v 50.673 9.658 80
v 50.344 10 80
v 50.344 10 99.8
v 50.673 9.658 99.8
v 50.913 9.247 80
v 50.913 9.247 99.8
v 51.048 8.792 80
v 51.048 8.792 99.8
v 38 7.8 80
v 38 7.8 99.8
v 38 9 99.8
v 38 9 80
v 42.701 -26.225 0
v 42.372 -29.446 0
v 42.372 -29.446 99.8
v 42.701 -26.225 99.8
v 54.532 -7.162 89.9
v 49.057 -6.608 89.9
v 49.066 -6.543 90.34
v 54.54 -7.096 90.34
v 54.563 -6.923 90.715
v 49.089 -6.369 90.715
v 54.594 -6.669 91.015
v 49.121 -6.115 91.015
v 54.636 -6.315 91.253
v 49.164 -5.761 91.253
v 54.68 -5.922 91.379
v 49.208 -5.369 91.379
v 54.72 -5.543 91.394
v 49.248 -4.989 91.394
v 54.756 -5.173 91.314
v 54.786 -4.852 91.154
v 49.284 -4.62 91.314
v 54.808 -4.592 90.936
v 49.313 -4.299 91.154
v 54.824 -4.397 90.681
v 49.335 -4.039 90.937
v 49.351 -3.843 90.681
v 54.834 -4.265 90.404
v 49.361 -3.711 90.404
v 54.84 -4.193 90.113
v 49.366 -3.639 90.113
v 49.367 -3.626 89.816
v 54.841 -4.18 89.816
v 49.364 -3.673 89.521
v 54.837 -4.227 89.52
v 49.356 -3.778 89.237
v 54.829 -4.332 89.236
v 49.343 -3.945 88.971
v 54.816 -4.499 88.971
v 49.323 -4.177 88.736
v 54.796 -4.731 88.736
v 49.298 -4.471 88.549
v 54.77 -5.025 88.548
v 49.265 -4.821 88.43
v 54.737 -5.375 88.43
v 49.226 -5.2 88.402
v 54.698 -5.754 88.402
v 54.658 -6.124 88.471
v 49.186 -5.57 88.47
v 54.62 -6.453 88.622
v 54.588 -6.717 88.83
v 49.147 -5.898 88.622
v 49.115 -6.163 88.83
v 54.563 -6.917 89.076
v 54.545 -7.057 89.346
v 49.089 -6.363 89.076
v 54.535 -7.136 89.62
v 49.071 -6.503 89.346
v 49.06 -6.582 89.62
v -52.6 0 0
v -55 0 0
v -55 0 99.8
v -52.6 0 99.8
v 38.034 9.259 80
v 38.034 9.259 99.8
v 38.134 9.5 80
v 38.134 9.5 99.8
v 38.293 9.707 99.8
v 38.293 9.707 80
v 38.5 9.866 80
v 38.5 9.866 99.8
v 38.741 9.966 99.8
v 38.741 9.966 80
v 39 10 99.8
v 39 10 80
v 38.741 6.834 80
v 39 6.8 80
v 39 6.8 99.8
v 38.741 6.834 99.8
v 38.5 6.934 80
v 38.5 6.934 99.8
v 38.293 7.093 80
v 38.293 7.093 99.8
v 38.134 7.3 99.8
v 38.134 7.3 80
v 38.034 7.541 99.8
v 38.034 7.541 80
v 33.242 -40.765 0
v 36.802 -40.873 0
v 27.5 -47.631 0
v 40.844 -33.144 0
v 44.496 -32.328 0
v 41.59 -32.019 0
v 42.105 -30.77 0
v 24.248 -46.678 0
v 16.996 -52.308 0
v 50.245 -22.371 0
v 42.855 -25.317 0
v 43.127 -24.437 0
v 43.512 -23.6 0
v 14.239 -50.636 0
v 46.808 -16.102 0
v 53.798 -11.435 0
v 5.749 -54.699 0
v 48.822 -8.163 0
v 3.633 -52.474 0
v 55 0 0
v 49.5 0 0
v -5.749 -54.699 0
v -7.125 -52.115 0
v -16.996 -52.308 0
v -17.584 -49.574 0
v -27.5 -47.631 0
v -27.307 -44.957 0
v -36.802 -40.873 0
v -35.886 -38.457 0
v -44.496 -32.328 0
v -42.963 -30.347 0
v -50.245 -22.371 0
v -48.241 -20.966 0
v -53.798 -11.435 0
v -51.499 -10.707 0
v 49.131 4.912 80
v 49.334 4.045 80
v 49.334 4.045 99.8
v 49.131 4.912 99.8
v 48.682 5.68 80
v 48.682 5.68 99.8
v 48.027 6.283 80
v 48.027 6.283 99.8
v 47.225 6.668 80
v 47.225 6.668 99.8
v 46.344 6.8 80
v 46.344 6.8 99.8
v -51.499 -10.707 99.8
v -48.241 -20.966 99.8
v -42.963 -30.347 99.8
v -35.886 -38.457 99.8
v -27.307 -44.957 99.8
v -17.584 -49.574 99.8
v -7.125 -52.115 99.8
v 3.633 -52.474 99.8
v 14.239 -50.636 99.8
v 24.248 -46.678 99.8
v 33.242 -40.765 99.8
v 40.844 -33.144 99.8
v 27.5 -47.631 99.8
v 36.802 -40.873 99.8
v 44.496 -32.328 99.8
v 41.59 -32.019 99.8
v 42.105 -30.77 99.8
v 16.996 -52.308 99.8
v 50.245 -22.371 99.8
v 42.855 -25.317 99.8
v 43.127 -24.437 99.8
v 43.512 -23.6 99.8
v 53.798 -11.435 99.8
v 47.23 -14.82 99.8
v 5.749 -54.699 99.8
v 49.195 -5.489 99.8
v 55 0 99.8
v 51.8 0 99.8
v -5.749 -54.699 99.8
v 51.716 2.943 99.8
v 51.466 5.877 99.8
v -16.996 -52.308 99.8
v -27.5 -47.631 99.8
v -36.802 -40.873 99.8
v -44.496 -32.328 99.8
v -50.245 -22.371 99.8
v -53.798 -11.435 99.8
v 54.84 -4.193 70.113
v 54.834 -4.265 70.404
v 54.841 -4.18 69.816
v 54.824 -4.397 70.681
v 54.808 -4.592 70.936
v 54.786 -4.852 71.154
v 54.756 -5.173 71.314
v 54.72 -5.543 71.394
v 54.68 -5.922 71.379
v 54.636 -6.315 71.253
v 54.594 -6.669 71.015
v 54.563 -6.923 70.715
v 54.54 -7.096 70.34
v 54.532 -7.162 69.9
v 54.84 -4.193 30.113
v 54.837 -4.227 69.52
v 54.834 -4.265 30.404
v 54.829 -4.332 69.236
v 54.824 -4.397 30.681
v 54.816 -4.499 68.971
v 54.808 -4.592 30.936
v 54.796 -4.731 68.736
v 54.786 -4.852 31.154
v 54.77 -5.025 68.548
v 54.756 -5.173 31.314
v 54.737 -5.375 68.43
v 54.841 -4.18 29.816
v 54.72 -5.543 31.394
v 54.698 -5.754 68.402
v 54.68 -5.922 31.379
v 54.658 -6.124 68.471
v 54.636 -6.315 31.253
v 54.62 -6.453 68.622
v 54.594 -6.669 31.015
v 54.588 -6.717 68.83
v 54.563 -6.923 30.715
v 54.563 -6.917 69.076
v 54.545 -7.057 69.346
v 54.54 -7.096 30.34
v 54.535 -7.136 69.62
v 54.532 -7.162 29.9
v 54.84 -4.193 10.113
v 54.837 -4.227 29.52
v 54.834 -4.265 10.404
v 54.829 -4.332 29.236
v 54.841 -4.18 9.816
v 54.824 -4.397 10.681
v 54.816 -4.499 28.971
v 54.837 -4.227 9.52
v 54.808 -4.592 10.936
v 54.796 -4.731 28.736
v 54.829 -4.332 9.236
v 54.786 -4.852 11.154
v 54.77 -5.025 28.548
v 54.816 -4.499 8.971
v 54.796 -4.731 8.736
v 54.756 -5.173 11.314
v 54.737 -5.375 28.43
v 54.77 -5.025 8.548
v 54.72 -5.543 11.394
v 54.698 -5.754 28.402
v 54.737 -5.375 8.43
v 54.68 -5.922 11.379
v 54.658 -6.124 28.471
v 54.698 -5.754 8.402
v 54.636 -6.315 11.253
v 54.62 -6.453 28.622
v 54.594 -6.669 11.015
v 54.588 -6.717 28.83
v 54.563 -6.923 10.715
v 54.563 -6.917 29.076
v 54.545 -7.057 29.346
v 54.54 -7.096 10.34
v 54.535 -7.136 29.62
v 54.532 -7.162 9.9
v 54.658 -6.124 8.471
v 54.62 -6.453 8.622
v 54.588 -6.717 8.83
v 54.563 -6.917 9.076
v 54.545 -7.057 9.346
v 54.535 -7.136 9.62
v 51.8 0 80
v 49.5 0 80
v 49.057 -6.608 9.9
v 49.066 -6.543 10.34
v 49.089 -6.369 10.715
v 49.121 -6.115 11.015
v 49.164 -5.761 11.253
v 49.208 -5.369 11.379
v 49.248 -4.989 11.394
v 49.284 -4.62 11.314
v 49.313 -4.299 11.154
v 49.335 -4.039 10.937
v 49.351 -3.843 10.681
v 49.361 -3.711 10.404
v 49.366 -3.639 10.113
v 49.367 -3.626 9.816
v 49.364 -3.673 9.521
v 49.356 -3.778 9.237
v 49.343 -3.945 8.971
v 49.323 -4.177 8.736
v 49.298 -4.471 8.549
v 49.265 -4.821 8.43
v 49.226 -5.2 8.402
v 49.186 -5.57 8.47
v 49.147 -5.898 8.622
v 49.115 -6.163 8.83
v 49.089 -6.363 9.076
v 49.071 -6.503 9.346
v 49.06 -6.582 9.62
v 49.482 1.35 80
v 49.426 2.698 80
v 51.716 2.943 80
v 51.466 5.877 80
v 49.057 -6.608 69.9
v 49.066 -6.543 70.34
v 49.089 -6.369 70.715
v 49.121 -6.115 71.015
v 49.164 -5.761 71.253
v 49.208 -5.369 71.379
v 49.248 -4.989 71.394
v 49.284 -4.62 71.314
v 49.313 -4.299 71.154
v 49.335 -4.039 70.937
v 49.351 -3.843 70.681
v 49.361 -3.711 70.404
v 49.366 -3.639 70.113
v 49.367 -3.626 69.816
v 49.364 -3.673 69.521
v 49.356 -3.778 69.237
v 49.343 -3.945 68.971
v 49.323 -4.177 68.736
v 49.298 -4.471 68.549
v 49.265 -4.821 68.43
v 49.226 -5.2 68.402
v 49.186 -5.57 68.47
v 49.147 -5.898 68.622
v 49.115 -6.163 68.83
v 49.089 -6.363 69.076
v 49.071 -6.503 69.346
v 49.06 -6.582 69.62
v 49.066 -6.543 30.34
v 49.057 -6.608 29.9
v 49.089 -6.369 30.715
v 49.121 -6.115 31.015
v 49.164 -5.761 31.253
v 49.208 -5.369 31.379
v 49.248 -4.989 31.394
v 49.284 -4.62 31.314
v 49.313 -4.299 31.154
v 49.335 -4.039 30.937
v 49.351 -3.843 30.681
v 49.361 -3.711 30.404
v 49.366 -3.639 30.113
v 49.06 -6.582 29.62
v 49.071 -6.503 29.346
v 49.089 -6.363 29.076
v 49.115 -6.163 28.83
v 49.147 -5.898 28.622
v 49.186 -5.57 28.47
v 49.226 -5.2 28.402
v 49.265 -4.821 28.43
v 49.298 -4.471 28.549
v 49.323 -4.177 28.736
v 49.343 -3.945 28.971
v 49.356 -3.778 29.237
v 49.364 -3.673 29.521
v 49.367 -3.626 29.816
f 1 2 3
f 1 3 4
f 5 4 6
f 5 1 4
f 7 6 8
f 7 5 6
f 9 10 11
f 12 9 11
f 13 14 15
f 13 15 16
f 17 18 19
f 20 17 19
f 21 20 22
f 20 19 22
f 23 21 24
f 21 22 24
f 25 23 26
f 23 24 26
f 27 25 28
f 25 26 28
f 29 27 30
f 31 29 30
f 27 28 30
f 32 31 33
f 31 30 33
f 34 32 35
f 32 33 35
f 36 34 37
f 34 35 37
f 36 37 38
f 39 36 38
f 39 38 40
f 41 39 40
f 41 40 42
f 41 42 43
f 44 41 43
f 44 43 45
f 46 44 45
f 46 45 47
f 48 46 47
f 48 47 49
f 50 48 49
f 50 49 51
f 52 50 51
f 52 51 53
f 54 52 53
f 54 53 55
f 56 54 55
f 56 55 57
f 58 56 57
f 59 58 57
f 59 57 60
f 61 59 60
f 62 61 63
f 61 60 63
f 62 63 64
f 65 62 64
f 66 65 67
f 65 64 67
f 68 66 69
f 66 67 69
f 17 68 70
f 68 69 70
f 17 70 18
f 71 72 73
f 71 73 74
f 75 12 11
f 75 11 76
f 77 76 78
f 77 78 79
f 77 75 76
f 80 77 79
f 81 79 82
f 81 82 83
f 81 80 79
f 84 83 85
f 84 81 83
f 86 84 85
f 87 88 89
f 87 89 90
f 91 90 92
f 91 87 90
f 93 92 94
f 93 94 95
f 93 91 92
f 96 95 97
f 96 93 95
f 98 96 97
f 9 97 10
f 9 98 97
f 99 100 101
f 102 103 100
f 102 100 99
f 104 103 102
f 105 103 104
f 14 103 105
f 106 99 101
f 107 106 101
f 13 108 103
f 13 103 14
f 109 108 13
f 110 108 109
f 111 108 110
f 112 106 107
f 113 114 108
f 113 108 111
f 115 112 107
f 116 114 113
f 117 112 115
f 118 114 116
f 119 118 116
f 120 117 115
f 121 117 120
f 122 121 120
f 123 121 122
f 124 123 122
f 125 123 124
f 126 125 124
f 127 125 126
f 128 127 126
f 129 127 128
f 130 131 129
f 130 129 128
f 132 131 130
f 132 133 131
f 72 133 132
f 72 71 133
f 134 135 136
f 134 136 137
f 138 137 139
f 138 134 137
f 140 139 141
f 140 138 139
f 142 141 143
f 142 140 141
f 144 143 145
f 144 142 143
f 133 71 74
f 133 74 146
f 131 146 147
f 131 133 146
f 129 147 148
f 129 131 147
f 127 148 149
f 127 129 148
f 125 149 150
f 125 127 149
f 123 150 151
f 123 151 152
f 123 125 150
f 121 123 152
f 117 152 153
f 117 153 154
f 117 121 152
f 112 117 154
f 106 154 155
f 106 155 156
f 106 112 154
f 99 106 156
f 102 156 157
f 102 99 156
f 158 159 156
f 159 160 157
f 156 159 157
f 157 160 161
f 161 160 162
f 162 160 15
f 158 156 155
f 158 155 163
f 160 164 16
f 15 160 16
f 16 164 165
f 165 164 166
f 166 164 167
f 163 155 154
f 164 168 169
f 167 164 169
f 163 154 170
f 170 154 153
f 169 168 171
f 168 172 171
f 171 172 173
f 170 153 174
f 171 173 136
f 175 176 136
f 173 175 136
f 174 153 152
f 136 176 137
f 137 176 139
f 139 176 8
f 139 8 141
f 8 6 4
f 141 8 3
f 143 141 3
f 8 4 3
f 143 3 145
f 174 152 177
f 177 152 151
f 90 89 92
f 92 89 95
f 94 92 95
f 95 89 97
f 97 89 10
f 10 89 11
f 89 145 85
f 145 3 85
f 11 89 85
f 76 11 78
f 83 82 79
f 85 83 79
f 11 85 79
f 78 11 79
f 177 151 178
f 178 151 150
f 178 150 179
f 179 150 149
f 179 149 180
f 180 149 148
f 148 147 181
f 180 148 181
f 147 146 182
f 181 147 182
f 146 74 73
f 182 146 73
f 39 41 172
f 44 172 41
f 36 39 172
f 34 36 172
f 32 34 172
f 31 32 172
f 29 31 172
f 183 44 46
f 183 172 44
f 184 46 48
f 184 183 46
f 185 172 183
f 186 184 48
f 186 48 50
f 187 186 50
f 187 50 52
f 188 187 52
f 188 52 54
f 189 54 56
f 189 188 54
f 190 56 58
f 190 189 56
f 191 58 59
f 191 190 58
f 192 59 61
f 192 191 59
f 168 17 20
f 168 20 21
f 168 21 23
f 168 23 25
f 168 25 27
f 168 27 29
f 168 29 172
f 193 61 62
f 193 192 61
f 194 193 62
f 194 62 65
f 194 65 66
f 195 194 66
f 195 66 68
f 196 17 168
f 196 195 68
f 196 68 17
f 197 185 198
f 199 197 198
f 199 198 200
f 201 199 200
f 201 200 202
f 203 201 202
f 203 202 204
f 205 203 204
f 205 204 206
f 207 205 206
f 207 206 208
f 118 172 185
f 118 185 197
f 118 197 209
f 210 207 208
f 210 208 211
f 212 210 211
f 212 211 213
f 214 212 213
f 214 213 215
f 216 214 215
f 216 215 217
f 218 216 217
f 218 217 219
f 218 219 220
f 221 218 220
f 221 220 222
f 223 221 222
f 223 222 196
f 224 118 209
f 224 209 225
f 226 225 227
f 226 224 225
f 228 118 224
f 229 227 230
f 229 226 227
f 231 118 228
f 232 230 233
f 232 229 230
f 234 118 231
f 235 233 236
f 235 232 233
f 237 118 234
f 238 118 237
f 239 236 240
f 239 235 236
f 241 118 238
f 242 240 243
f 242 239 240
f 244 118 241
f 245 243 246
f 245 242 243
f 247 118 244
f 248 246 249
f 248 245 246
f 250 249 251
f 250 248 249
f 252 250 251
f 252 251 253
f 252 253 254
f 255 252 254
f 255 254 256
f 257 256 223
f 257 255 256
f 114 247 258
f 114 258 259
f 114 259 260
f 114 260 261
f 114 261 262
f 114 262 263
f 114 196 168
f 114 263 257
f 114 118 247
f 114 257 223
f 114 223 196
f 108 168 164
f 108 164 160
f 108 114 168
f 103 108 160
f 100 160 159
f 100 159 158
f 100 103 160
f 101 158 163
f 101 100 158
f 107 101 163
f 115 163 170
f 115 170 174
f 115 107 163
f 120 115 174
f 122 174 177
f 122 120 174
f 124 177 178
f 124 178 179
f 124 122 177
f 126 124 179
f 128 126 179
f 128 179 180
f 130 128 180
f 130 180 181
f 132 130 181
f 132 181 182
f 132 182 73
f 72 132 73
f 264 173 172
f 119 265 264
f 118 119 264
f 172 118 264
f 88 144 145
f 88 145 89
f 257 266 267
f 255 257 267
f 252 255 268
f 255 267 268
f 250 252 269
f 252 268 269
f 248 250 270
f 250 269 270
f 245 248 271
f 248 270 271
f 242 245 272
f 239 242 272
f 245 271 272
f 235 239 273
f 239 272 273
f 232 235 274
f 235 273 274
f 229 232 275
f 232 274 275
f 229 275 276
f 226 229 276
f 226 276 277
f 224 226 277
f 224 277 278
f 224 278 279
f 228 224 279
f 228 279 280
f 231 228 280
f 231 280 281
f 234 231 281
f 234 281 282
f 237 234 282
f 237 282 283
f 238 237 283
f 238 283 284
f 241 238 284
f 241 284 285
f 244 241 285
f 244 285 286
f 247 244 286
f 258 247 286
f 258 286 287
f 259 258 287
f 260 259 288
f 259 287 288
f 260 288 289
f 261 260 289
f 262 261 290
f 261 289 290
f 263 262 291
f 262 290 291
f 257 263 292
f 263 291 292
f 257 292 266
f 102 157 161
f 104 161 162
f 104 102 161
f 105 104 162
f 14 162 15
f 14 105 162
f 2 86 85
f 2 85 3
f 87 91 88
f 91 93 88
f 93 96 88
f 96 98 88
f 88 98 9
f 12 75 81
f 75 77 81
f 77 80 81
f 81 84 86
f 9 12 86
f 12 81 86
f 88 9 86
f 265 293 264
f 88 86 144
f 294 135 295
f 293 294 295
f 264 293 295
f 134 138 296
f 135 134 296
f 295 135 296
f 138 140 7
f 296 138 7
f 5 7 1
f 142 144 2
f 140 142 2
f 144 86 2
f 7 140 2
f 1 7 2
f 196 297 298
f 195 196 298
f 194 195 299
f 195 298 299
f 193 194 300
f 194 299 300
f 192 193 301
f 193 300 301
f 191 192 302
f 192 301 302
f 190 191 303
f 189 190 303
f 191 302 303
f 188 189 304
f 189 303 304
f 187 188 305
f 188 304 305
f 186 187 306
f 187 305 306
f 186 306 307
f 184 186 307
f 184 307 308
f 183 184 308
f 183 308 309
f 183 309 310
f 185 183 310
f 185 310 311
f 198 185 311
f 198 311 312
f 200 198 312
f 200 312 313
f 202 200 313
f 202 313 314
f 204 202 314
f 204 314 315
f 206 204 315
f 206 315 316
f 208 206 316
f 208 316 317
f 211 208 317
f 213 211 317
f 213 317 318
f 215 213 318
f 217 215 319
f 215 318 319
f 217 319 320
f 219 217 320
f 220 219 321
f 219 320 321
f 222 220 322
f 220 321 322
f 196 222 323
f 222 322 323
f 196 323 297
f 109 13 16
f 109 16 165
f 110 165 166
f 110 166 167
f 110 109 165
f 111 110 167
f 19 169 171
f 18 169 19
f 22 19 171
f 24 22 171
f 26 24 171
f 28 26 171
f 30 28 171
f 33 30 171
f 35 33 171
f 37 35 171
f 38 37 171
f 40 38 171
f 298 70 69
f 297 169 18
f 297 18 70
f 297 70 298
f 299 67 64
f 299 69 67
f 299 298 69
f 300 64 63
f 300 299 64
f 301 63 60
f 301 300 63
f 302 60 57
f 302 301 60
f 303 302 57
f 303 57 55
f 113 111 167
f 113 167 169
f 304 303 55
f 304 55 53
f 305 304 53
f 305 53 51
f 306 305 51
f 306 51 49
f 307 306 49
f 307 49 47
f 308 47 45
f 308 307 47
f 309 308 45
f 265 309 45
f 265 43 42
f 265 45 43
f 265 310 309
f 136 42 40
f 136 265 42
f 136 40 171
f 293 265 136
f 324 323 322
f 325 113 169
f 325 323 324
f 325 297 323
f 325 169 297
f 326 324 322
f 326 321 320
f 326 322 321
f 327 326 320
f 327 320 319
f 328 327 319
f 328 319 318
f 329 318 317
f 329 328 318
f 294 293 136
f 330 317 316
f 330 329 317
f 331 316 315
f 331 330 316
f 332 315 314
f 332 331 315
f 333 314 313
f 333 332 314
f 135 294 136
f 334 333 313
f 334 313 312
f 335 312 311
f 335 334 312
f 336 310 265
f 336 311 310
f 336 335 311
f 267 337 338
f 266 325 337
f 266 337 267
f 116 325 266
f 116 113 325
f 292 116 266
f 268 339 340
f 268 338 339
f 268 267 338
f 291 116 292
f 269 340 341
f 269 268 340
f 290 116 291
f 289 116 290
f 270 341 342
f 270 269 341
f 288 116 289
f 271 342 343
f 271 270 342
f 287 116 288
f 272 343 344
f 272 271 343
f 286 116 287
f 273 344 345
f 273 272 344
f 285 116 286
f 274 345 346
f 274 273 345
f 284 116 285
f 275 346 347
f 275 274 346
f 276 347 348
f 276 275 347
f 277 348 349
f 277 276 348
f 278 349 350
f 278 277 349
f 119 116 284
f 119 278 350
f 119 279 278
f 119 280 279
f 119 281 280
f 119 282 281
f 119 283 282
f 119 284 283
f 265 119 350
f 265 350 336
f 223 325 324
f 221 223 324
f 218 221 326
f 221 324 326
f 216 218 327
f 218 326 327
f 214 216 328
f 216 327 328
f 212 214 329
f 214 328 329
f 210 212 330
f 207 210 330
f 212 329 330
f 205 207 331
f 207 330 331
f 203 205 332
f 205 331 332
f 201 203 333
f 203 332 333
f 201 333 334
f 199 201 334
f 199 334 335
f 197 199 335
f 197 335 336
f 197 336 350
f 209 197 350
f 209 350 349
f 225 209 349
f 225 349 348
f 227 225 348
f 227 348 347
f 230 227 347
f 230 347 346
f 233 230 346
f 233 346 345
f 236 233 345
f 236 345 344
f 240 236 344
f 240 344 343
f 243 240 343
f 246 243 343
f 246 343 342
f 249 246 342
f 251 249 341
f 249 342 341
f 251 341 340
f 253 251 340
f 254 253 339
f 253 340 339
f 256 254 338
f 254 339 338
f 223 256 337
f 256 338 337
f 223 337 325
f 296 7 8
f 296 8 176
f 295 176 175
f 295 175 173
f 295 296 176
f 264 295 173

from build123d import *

# Parameters (mm, degrees)
EXTRUDE_1_DEPTH     = 99.8
SKETCH_7_R          = 1.5
CUT_EXTRUDE_6_DEPTH = 80
CUT_EXTRUDE_7_DEPTH = 80


with BuildPart() as part:
    # 草图1 → 凸台-拉伸1 (new body)
    with BuildSketch(Plane.XY):
        with BuildLine():
            Line((-55, 0), (-52.6, 0))
            ThreePointArc((-52.6, 0), (-17.5838694, -49.573859411), (40.843632582, -33.144496941))
            ThreePointArc((40.843632582, -33.144496941), (41.8776275, -31.406850611), (42.371810697, -29.446150933))
            Line((42.371810697, -29.446150933), (42.701389329, -26.225087281))
            ThreePointArc((42.701389329, -26.225087281), (42.976584625, -24.872497257), (43.511842068, -23.600203386))
            ThreePointArc((43.511842068, -23.600203386), (48.437324754, -10.201743511), (49.33443696, 4.04516129))
            ThreePointArc((49.33443696, 4.04516129), (48.377266711, 6.006295976), (46.344471083, 6.8))
            Line((46.344471083, 6.8), (39, 6.8))
            ThreePointArc((39, 6.8), (38.292893219, 7.092893219), (38, 7.8))
            Line((38, 7.8), (38, 9))
            ThreePointArc((38, 9), (38.292893219, 9.707106781), (39, 10))
            Line((39, 10), (50.344019583, 10))
            ThreePointArc((50.344019583, 10), (50.805346897, 9.459374484), (51.0484918, 8.791557597))
            ThreePointArc((51.0484918, 8.791557597), (51.611780996, 4.411809423), (51.8, 0))
            Line((51.8, 0), (55, 0))
            ThreePointArc((55, 0), (0, -55), (-55, 0))
        make_face()
    extrude(amount=EXTRUDE_1_DEPTH)

    # 草图7 → 切除-拉伸6 (cut)
    with BuildSketch(Plane(origin=(0, 0, 0), x_dir=(0.10066073352284005, 0.994920809274107, 0), z_dir=(-0.9949208092741069, 0.10066073352284004, 0))):
        with Locations(Location((-0.136340344, -9.9, 0), (0, 0, 180))):
            Circle(SKETCH_7_R)
        with Locations(Location((-0.136340344, -29.9, 0), (0, 0, 180))):
            Circle(SKETCH_7_R)
        with Locations(Location((-0.136340344, -69.9, 0), (0, 0, 180))):
            Circle(SKETCH_7_R)
        with Locations(Location((-0.136340344, -89.9, 0), (0, 0, 180))):
            Circle(SKETCH_7_R)
    extrude(amount=-CUT_EXTRUDE_6_DEPTH, mode=Mode.SUBTRACT)

    # 草图8 → 切除-拉伸7 (cut)
    with BuildSketch(Plane(origin=(0, 0, 0), x_dir=(-1, 0, 0), z_dir=(0, 0, -1))):
        with BuildLine():
            Line((-50.016978469, 22.875792113), (0, 0))
            Line((0, 0), (-55, 0))
            ThreePointArc((-55, 0), (-53.739807479, 11.70611345), (-50.016978469, 22.875792113))
        make_face()
    extrude(amount=-CUT_EXTRUDE_7_DEPTH, mode=Mode.SUBTRACT)


solid = part.part
